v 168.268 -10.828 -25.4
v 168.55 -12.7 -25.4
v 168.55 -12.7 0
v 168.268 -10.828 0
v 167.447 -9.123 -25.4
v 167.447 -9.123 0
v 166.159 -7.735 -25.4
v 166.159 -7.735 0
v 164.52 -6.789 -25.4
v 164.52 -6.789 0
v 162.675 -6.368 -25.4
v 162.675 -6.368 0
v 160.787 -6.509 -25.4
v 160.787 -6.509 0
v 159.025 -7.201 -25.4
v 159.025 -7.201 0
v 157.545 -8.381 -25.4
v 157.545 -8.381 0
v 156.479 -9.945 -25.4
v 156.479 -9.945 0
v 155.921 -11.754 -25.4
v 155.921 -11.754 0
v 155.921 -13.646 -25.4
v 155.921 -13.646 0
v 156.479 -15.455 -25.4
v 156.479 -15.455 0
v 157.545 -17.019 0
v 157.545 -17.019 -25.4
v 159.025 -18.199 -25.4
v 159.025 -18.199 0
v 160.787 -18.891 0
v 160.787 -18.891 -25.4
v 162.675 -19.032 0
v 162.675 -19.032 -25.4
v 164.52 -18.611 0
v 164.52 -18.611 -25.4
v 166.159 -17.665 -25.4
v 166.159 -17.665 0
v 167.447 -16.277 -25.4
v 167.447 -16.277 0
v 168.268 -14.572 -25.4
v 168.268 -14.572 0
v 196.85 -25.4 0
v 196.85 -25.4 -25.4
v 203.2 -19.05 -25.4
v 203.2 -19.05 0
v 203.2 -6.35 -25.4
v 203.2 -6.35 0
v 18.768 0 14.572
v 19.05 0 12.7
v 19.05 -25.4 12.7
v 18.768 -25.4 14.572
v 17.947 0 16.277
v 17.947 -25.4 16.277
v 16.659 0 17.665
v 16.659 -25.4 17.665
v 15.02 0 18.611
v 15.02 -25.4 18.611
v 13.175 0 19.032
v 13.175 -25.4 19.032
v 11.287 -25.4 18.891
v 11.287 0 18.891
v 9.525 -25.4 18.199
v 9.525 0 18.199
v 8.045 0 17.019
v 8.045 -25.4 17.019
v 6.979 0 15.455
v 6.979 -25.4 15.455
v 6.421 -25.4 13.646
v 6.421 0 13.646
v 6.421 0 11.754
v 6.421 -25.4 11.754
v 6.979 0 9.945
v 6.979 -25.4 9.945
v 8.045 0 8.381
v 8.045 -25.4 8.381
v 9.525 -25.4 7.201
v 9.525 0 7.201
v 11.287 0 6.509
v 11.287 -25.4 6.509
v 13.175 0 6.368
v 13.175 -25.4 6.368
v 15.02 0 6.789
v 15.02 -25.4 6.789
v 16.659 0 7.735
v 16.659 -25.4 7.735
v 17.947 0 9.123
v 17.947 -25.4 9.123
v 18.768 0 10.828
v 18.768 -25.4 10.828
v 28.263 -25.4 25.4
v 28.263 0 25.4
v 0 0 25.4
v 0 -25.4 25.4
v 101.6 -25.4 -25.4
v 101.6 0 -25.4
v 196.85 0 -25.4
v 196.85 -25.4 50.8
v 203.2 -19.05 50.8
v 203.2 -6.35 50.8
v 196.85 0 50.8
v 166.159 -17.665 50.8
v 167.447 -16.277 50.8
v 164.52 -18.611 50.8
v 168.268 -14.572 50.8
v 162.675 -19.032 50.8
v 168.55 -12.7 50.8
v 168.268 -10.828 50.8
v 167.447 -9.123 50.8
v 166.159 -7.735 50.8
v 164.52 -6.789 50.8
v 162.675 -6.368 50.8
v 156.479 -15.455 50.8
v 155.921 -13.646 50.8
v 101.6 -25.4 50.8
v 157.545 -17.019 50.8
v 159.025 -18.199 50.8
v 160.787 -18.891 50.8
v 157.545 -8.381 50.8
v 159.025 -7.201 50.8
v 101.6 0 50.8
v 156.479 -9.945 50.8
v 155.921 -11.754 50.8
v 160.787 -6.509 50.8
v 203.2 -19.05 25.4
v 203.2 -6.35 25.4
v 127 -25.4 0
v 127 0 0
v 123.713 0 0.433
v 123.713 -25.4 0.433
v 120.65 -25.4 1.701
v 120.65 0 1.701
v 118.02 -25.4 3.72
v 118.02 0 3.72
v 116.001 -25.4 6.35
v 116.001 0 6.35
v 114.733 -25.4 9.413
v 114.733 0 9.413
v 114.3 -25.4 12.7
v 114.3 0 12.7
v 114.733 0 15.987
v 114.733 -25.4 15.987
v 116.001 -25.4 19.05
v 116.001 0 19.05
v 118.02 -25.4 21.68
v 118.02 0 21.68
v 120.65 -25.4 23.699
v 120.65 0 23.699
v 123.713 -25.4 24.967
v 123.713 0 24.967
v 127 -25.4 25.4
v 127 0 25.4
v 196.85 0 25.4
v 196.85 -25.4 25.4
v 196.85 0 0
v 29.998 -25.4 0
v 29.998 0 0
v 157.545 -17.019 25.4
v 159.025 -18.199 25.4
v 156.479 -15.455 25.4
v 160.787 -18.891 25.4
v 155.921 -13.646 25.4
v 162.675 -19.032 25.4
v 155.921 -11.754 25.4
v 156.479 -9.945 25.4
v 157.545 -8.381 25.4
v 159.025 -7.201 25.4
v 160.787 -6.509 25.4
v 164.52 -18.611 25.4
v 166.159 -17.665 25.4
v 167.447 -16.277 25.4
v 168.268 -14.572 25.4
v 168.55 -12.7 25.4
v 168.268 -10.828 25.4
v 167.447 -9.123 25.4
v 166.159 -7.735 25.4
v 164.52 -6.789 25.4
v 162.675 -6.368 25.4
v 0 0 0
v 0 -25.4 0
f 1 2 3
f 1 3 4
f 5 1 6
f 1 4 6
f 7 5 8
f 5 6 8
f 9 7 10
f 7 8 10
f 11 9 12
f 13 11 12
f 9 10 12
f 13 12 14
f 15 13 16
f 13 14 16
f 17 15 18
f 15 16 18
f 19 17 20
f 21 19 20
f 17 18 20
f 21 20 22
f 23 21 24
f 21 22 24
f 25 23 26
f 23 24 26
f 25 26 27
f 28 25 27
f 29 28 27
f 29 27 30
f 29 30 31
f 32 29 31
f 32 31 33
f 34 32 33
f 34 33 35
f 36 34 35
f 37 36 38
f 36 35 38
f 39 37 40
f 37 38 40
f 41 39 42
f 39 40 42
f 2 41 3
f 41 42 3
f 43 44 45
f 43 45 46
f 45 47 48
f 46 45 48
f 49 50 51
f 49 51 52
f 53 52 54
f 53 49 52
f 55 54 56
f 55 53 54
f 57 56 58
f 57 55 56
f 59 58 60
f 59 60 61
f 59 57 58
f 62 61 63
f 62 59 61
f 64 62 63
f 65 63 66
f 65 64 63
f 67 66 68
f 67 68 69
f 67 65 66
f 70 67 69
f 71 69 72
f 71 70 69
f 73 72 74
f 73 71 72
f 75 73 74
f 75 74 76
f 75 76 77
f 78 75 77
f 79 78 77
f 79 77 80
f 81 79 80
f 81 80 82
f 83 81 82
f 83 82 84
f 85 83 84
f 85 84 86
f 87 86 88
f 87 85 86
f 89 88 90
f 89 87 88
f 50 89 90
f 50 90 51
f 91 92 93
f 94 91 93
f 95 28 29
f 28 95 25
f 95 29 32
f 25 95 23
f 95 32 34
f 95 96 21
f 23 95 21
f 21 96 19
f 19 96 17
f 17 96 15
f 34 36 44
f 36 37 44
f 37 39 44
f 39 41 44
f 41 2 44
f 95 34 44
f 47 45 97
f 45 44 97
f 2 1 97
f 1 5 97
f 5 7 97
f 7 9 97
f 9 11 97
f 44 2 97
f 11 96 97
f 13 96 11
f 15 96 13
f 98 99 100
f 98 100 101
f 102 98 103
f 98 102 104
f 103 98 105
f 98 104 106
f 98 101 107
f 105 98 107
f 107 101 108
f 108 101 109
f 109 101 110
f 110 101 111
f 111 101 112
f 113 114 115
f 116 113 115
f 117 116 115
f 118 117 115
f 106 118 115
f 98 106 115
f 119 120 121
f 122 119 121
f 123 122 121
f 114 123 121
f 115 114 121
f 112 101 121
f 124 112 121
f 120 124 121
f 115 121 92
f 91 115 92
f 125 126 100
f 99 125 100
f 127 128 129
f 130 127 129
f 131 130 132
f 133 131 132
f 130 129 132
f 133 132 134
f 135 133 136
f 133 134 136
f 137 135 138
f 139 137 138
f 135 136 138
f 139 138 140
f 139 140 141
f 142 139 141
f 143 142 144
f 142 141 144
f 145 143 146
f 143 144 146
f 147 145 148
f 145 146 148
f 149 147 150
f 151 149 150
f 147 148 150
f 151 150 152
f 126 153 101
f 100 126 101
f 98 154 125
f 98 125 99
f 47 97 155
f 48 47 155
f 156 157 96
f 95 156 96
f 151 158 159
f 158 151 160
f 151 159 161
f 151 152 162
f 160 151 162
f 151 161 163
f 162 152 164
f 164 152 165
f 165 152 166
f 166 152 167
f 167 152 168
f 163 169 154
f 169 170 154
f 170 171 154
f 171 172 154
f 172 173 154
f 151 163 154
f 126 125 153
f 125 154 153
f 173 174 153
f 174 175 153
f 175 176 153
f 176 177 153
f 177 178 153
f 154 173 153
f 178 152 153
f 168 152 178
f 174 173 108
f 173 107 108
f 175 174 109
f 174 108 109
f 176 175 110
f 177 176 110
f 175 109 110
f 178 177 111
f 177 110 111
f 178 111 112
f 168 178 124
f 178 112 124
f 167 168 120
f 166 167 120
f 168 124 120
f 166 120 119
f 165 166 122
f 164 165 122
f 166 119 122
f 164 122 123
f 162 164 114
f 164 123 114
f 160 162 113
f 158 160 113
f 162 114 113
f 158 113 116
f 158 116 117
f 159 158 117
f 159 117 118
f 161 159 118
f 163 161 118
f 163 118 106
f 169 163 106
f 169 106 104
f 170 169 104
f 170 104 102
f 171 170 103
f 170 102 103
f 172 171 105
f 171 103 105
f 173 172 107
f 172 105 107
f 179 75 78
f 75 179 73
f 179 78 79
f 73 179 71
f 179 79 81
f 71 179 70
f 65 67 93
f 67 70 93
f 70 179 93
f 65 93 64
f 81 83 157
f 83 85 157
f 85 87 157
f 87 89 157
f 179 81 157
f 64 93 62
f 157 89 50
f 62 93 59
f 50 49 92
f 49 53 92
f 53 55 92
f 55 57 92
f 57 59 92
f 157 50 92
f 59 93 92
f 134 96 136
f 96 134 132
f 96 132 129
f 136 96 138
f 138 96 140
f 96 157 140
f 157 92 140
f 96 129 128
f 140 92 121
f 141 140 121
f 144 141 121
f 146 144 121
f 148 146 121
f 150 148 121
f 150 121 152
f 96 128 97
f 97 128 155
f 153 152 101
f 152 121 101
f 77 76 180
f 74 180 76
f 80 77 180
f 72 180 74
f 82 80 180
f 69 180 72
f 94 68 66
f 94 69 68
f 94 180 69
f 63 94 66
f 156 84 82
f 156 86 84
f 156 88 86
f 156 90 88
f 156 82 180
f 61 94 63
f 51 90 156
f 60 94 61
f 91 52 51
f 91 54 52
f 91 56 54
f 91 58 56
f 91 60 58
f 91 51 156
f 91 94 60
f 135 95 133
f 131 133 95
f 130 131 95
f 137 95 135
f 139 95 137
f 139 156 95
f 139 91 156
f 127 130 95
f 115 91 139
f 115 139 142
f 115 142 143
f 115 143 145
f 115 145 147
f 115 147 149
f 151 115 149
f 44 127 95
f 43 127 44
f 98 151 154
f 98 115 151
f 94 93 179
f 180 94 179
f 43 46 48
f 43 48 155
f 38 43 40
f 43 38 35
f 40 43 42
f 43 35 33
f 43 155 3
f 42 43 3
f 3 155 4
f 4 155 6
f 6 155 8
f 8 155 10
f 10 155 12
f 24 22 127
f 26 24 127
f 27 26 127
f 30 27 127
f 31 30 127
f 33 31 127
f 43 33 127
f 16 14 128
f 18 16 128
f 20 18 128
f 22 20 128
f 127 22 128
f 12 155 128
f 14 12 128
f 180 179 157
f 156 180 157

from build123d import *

# Parameters (mm, degrees)
F0_R     = 6.35
F2_DEPTH = 25.4
F3_SIZE2 = 6.35
F3_SIZE  = 6.35
F1_R     = 6.35
F4_DEPTH = 127


with BuildPart() as f2:
    # F0 (on Front) → F2 (new body)
    with BuildSketch(Plane.XZ):
        with BuildLine():
            Line((0, 25.4), (0, 0))
            Line((0, 0), (29.997984, 0))
            Line((29.997984, 0), (101.6, -25.4))
            Line((101.6, -25.4), (203.2, -25.4))
            Line((203.2, -25.4), (203.2, 0))
            Line((203.2, 0), (127, 0))
            ThreePointArc((127, 0), (118.019744, 3.719744), (114.3, 12.7))
            ThreePointArc((114.3, 12.7), (118.019744, 21.680256), (127, 25.4))
            Line((127, 25.4), (203.2, 25.4))
            Line((203.2, 25.4), (203.2, 50.8))
            Line((203.2, 50.8), (101.6, 50.8))
            Line((101.6, 50.8), (28.262794, 25.4))
            Line((28.262794, 25.4), (0, 25.4))
        make_face()
        with Locations((12.7, 12.7)):
            Circle(F0_R, mode=Mode.SUBTRACT)
    extrude(amount=F2_DEPTH)

    # F3
    f3_edges = [f2.edges().sort_by_distance(p)[0] for p in [
        (203.2, -25.4, 38.1),
        (203.2, -25.4, -12.7),
        (203.2, 0, -12.7),
        (203.2, 0, 38.1),
    ]]
    chamfer(f3_edges, length=F3_SIZE, length2=F3_SIZE2)

    # F1 (on Top) → F4 (cut, symmetric)
    with BuildSketch(Plane.XY):
        with Locations((162.2, -12.7)):
            Circle(F1_R)
    extrude(amount=F4_DEPTH, both=True, mode=Mode.SUBTRACT)


solid = f2.part
